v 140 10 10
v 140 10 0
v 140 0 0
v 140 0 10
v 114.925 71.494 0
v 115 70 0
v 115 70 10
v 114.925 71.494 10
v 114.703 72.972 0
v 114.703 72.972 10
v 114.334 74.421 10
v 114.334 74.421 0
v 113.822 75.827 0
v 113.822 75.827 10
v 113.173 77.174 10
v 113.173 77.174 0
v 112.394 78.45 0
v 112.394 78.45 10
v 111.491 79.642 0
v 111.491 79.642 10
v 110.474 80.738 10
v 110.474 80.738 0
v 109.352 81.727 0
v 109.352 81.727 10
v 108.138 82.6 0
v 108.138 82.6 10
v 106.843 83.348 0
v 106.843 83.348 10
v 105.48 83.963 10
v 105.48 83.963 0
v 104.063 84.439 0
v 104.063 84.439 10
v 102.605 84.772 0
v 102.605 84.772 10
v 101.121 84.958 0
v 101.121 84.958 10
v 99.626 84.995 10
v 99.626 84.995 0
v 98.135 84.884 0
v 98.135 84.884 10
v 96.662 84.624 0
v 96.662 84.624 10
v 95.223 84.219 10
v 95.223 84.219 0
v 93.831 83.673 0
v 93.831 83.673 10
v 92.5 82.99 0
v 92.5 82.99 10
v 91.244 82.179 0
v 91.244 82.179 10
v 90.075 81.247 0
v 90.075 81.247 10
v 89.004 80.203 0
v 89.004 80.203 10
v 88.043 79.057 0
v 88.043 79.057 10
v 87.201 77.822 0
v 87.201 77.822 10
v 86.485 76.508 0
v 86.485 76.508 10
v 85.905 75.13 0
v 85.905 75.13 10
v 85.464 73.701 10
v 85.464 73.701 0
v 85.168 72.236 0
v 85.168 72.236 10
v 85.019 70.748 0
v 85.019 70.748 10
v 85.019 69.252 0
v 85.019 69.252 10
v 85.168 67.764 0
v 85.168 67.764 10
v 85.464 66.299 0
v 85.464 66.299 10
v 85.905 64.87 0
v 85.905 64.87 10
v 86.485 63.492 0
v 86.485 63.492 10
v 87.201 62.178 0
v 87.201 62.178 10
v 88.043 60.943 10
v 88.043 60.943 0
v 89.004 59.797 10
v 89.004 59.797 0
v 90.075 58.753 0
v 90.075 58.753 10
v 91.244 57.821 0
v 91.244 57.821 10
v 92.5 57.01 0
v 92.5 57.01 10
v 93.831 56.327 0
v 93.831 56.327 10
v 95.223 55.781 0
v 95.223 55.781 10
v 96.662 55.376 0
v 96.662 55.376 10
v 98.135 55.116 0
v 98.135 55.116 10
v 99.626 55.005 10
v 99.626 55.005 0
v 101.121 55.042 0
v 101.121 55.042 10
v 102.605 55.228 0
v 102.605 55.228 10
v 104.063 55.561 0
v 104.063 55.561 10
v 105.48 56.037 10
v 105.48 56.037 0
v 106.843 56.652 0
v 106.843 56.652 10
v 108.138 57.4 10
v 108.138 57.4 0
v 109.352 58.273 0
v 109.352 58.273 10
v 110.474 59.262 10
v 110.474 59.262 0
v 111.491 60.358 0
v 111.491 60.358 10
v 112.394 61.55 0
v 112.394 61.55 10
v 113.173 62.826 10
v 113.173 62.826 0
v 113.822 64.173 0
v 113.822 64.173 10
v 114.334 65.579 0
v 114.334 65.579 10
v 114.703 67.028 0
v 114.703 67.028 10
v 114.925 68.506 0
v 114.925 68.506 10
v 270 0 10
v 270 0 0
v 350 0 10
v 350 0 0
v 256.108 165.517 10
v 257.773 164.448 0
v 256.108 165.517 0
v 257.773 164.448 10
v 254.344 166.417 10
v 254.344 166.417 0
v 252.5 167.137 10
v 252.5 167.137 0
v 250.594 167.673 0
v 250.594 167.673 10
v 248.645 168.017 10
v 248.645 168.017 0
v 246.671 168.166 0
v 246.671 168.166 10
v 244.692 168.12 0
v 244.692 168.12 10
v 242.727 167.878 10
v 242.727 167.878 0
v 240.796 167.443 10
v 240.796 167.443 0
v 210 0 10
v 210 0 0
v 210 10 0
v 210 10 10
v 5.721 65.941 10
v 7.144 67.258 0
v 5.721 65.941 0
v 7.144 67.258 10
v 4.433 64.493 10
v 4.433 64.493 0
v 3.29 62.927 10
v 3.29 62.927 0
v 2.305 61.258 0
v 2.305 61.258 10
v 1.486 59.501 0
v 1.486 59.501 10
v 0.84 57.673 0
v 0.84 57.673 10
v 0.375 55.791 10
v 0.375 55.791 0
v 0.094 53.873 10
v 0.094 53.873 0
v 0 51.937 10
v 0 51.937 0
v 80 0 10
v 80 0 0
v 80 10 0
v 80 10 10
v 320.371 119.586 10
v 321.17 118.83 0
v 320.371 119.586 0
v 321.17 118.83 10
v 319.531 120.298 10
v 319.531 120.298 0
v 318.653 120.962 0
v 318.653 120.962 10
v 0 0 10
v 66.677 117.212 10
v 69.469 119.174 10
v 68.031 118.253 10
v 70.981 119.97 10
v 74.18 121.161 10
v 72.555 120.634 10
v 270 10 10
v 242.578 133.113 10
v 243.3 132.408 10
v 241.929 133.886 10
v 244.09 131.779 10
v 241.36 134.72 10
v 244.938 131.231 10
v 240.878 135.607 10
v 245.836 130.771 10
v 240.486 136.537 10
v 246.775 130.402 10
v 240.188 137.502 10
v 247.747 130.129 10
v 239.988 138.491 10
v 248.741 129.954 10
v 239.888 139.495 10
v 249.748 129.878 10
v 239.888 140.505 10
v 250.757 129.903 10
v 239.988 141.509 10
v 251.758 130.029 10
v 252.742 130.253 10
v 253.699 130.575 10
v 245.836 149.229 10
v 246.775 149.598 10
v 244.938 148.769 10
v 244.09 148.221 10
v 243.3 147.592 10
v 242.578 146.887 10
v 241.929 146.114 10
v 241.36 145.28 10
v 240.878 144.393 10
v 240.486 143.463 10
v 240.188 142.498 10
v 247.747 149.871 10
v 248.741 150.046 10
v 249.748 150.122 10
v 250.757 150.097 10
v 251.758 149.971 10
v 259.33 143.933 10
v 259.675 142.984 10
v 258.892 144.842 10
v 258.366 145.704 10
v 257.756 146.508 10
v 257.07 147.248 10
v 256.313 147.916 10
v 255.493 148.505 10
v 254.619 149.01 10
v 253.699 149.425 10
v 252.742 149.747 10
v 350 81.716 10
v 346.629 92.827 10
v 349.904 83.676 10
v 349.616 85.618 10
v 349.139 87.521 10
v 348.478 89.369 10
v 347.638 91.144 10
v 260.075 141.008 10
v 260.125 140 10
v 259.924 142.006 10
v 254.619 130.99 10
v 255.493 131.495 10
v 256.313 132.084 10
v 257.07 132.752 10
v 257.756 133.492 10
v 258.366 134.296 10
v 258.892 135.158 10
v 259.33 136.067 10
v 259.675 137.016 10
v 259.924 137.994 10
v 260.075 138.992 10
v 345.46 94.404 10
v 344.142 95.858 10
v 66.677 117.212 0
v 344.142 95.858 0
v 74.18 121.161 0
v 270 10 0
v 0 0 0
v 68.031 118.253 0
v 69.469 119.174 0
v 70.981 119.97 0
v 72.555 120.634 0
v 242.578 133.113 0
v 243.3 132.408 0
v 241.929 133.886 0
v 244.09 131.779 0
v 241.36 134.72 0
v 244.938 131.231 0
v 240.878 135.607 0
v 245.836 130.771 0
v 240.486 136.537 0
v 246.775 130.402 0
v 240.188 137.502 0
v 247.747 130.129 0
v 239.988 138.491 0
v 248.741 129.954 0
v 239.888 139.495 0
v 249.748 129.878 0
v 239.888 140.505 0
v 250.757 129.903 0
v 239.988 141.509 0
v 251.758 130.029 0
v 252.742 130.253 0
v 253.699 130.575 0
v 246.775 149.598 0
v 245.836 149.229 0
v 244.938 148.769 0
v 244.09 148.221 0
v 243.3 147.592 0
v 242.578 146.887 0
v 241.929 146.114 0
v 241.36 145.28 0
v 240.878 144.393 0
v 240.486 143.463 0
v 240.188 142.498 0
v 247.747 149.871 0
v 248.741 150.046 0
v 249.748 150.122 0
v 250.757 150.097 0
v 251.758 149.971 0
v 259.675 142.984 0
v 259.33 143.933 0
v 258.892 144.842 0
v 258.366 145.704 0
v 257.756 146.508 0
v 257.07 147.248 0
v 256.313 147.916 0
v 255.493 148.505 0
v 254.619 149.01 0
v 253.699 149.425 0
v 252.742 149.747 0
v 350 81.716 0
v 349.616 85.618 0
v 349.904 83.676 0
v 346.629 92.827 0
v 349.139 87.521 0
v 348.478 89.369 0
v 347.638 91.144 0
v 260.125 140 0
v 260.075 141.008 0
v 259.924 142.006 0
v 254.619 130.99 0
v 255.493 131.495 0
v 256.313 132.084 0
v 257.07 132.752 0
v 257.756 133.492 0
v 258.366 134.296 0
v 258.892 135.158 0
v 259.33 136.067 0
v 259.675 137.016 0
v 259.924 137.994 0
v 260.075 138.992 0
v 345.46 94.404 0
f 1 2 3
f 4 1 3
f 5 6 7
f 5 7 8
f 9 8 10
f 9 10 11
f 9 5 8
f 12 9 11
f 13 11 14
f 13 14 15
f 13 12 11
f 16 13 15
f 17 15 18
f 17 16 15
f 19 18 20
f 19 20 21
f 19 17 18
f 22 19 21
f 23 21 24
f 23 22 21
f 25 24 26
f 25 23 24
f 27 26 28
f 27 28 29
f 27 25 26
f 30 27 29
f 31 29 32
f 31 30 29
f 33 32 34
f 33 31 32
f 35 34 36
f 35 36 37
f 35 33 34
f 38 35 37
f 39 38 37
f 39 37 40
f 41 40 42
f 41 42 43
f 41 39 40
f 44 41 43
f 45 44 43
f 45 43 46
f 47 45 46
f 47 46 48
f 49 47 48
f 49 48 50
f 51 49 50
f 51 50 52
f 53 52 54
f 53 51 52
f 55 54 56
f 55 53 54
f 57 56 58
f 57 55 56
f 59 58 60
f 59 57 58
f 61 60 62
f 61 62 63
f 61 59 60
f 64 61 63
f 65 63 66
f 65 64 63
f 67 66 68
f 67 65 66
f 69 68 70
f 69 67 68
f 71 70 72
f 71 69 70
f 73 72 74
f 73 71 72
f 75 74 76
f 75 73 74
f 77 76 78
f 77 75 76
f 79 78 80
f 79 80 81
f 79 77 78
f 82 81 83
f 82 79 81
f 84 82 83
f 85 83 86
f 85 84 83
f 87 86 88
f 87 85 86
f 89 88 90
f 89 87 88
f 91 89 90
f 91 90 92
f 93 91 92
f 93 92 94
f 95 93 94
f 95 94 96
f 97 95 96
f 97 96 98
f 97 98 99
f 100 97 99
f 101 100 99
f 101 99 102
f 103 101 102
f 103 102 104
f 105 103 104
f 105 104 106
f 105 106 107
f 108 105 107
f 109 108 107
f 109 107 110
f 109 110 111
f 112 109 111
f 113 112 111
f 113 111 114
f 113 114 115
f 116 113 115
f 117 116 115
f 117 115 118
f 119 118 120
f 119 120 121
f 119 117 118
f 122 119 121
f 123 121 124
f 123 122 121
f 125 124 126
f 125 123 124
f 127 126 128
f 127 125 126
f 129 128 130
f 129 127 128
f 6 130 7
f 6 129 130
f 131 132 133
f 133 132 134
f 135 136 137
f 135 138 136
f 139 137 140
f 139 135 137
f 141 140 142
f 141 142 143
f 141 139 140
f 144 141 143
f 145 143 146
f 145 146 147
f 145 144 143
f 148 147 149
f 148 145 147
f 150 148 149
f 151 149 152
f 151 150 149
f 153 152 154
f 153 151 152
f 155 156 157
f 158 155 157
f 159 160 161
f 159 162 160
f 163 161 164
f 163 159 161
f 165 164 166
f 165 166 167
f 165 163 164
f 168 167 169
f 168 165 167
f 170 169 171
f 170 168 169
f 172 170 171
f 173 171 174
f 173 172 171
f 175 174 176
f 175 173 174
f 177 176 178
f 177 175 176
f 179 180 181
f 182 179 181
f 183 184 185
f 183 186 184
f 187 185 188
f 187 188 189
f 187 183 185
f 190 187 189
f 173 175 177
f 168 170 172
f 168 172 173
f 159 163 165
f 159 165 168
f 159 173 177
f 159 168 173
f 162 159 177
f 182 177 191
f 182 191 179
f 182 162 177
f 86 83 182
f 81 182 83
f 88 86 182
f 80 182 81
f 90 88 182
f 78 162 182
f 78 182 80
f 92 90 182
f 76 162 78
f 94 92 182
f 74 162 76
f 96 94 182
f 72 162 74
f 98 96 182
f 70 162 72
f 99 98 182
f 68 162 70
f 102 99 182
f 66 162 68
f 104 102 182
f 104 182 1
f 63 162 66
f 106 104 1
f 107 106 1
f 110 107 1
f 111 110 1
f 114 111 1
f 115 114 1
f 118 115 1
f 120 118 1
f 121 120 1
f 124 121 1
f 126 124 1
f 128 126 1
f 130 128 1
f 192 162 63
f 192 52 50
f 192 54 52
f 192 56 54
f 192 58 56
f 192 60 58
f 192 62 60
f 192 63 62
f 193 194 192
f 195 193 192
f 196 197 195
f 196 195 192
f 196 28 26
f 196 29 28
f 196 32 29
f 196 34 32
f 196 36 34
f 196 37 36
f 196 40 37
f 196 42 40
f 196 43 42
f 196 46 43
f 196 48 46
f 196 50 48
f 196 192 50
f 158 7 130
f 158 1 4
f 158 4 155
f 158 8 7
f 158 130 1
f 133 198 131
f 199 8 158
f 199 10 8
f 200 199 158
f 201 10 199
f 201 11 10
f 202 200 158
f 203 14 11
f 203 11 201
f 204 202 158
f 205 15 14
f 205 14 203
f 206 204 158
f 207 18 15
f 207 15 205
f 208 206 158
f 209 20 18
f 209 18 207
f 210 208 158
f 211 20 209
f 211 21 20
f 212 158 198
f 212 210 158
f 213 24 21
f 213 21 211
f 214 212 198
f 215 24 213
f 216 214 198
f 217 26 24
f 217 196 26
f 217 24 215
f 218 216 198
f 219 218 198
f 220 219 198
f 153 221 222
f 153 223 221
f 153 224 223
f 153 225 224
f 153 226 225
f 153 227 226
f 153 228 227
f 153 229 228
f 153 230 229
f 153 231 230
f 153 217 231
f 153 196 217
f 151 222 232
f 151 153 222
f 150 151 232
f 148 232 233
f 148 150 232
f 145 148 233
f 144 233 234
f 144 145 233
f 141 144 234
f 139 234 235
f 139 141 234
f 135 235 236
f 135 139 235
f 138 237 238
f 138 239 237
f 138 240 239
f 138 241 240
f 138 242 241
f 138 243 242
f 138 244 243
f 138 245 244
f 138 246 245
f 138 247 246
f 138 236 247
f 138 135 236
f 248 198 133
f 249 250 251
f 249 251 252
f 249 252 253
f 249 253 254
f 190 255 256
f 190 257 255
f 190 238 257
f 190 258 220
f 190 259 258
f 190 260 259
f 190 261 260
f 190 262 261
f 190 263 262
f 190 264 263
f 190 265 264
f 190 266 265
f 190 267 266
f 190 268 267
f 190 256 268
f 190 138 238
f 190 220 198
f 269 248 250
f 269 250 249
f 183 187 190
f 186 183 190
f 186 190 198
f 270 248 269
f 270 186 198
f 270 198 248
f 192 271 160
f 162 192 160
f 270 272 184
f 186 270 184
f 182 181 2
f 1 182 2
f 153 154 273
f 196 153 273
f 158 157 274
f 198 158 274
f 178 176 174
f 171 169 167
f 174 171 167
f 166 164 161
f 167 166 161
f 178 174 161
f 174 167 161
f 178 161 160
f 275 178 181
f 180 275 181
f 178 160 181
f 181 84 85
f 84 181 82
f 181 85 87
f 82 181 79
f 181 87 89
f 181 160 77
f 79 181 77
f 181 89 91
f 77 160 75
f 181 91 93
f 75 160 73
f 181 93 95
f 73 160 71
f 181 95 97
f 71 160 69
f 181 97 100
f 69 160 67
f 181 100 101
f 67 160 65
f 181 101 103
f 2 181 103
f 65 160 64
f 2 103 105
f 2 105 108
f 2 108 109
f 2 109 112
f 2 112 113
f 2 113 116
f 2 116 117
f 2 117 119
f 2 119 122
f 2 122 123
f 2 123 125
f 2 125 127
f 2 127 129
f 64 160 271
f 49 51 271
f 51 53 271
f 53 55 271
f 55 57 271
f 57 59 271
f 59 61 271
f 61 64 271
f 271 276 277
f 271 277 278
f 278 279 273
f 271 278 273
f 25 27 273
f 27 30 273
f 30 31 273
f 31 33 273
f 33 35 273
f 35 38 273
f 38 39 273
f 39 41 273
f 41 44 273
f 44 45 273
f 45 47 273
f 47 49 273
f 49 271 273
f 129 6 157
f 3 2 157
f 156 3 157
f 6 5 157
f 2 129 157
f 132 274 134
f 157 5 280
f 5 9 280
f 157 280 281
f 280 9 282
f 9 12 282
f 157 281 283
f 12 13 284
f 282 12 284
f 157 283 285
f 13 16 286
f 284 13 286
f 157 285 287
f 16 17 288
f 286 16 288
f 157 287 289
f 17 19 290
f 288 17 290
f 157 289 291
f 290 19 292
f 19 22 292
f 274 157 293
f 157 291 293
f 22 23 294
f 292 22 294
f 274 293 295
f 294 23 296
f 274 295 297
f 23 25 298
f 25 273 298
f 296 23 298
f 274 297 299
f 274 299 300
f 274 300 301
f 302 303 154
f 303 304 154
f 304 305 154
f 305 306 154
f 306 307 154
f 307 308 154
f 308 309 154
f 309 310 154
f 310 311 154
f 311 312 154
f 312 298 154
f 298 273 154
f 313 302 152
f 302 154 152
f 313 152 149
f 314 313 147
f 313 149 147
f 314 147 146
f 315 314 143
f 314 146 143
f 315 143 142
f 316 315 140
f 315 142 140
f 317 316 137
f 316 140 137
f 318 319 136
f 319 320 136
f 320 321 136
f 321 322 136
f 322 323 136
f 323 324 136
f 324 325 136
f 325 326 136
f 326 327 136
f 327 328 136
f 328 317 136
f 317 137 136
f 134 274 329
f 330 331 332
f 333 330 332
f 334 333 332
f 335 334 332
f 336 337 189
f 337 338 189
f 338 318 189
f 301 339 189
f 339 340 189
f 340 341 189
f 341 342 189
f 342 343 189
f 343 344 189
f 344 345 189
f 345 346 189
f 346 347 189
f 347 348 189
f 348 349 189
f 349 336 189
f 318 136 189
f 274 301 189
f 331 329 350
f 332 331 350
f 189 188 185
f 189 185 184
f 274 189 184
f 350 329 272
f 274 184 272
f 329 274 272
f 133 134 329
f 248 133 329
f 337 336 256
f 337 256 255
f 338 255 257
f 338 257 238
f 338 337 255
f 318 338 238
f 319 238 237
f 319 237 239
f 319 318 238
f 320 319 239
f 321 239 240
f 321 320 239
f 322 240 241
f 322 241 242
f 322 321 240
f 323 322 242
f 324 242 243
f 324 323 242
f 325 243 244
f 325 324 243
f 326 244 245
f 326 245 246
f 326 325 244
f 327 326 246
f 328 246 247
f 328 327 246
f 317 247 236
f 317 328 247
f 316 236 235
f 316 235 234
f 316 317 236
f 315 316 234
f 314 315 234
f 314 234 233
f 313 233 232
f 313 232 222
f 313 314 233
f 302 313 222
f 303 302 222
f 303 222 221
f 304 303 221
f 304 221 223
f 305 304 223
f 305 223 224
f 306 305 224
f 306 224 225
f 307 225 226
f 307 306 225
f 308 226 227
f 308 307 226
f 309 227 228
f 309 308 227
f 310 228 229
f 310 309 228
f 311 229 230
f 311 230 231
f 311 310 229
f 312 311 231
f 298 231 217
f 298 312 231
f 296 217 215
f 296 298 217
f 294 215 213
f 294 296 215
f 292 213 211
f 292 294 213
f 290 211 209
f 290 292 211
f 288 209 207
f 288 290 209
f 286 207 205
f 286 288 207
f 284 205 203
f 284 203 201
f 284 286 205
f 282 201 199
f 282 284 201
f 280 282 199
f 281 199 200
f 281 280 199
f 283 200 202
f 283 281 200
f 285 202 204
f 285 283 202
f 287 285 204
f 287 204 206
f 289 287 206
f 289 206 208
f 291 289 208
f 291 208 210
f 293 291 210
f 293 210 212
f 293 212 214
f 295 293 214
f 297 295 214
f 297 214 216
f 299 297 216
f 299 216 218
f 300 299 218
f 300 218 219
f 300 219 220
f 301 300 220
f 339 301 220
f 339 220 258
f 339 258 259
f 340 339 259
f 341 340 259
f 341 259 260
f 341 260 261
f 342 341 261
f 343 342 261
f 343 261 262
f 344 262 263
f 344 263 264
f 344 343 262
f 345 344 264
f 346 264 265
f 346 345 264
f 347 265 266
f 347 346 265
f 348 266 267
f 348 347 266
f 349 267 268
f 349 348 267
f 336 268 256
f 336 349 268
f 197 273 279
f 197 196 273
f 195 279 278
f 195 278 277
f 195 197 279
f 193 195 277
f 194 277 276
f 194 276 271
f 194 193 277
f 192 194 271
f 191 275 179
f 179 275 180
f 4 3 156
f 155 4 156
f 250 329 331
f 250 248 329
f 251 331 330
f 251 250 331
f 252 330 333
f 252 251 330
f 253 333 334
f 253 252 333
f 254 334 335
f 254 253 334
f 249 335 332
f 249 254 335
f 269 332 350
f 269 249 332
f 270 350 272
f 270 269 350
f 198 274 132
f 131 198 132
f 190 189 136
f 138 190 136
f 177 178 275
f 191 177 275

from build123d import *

# Parameters (mm, degrees)
ESQUISSE1_R        = 15
ESQUISSE1_R_2      = 10.125
BOSS_EXTRU_1_DEPTH = 10
CONG_1_R           = 20


with BuildPart() as part:
    # Esquisse1 → Boss.-Extru.1 (new body)
    with BuildSketch(Plane.XY):
        Polygon((350, 0), (350, 90), (320, 120), (250, 170), (70, 120), (0, 61.263025818), (0, 0), (80, 0), (80, 10), (140, 10), (140, 0), (210, 0), (210, 10), (270, 10), (270, 0), align=None)
        with Locations((100, 70)):
            Circle(ESQUISSE1_R, mode=Mode.SUBTRACT)
        with Locations((250, 140)):
            Circle(ESQUISSE1_R_2, mode=Mode.SUBTRACT)
    extrude(amount=BOSS_EXTRU_1_DEPTH)

    # Congé1
    cong_1_edges = [part.edges().sort_by_distance(p)[0] for p in [
        (0, 61.263025818, 5),
        (70, 120, 5),
        (250, 170, 5),
        (320, 120, 5),
        (350, 90, 5),
    ]]
    fillet(cong_1_edges, radius=CONG_1_R)


solid = part.part
